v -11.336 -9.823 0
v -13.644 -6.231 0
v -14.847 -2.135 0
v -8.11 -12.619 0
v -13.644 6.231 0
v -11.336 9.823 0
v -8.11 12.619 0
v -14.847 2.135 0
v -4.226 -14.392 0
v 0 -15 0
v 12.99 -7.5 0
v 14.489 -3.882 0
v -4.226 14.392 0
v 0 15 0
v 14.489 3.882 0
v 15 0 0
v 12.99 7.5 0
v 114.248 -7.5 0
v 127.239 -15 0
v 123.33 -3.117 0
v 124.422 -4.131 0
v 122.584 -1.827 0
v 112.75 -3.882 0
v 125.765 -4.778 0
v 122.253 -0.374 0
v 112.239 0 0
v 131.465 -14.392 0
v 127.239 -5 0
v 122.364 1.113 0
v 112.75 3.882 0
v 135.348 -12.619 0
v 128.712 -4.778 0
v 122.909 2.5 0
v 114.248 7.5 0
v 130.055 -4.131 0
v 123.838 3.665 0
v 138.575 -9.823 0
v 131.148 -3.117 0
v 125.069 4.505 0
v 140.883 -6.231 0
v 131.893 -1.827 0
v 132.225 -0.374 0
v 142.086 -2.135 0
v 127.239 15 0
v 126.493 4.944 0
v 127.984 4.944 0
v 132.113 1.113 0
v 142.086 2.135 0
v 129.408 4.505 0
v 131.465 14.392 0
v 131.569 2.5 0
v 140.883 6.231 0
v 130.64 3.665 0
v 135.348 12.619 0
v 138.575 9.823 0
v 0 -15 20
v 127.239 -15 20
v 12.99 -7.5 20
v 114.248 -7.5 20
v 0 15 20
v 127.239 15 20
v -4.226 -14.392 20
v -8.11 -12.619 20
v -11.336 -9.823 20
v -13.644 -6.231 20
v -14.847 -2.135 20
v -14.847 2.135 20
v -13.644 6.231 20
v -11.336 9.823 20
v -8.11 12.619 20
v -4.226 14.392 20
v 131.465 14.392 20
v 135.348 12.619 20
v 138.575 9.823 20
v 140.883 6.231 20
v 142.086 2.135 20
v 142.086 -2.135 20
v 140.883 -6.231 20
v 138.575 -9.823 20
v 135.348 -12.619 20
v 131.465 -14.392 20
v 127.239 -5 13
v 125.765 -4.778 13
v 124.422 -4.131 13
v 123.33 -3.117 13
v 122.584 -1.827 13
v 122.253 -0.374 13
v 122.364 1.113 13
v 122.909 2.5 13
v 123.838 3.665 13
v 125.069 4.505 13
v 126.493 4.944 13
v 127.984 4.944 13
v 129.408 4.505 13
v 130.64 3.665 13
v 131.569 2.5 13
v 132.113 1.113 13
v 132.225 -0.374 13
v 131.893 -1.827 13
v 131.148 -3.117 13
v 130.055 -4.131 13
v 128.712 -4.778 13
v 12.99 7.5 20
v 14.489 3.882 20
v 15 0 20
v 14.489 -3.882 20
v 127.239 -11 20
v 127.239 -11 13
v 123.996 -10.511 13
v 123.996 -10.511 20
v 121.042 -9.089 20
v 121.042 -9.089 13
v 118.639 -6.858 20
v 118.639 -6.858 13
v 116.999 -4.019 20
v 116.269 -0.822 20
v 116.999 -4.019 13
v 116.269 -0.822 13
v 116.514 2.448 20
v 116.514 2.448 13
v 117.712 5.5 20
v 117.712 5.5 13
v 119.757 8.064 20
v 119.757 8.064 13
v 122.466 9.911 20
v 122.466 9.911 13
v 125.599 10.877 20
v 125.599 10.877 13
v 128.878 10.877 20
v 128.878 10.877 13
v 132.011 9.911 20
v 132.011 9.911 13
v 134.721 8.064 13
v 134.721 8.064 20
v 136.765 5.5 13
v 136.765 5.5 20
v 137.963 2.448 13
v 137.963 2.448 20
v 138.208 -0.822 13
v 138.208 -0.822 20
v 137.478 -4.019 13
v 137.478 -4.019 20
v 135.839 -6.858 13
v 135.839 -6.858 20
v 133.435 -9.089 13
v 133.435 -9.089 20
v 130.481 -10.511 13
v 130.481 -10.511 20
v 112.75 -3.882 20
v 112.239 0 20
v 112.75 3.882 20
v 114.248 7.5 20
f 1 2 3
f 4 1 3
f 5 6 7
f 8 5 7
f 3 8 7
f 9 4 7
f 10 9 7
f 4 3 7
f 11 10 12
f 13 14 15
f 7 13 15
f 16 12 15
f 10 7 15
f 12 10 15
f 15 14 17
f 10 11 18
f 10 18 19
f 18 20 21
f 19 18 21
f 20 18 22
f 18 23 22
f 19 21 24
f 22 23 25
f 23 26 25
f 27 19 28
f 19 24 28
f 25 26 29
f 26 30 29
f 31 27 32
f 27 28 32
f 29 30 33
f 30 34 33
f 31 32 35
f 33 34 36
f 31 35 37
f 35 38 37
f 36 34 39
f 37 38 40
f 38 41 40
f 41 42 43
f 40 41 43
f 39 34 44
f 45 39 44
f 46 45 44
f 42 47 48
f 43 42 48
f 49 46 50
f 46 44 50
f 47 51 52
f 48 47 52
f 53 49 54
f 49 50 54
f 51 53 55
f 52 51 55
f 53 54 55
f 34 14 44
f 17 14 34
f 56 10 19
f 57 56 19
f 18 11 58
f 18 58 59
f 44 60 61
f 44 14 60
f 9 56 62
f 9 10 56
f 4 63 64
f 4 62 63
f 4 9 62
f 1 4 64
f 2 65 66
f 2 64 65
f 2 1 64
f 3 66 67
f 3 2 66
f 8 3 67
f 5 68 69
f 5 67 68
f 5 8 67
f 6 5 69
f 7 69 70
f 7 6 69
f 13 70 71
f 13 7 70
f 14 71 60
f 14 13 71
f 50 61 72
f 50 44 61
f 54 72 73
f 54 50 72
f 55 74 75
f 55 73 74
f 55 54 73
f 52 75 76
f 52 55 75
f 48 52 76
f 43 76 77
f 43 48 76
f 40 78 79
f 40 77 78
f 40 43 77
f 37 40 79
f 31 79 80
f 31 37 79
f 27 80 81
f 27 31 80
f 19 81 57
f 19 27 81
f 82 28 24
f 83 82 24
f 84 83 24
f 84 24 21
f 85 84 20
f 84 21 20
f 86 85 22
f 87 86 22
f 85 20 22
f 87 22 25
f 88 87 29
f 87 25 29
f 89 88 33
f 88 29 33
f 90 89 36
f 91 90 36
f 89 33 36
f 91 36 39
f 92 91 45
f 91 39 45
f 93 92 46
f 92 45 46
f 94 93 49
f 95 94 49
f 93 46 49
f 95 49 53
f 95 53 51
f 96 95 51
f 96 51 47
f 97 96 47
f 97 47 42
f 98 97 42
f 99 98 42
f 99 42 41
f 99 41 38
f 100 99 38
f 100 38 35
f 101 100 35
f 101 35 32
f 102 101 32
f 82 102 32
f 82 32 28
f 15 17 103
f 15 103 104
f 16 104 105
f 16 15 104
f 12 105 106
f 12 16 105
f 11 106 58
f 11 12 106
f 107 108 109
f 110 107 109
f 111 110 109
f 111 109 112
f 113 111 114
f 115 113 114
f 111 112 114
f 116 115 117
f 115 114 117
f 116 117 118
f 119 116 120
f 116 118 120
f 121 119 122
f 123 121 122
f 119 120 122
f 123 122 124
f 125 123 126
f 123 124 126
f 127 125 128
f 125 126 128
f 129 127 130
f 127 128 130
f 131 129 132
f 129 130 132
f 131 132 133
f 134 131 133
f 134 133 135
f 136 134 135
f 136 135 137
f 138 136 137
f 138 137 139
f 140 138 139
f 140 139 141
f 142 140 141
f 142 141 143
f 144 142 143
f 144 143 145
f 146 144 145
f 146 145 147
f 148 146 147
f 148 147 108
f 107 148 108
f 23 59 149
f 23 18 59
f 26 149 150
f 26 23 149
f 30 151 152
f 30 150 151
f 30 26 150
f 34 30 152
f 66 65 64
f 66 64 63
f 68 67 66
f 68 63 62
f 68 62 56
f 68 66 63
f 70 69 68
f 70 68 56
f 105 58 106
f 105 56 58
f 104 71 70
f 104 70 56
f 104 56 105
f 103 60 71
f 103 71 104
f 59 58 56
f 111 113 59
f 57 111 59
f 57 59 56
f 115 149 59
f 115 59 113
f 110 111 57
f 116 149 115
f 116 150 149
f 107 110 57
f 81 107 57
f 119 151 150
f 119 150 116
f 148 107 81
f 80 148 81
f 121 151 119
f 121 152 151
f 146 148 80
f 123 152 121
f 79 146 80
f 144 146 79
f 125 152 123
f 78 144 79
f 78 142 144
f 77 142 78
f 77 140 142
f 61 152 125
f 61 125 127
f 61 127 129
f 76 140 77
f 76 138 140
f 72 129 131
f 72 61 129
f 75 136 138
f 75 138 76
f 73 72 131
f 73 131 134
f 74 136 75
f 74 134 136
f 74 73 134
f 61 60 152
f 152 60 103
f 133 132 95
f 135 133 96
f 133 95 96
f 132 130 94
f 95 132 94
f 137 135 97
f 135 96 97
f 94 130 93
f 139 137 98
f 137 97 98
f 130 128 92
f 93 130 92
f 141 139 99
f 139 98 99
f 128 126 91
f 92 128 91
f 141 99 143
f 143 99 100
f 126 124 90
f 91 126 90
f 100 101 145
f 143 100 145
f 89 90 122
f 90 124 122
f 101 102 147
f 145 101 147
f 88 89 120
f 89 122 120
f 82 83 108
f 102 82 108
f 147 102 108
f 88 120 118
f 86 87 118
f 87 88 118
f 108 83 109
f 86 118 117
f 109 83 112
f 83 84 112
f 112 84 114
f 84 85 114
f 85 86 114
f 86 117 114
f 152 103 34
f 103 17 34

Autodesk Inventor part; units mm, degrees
ref_plane "YZ Plane" through (0, 0, 0) normal (1, 0, 0) x (0, 1, 0)
ref_plane "XZ Plane" through (0, 0, 0) normal (0, 1, 0) x (-1, 0, 0)
ref_plane "XY Plane" through (0, 0, 0) normal (0, 0, 1) x (1, 0, 0)
sketch "Sketch1" plane through (0, 0, 0) normal (0, 0, 1) x (1, 0, 0)
  circle A0 centre (0, 0) radius 15
  circle A1 centre (127.2387, 0) radius 15
  line L0 (0, 15) -> (127.2387, 15)
  line L1 (0, -15) -> (127.2387, -15)
  line L2 (12.9904, -7.5) -> (114.2483, -7.5)
  line L3 (12.9904, 7.5) -> (114.2483, 7.5)
  dimension "d0" = 30
  dimension "d1" = 127.2387
  dimension "d2" = 7.5
  dimension "d3" = 7.5
extrude "Extrusion1" add sketch "Sketch1" along normal blind 20 contours A0 | A0 L0 A1 L3 | L2 A1 L1 A0 | A1
sketch "Sketch2" plane through (0, 0, 20) normal (0, 0, 1) x (1, 0, 0)
  arc A0 (127.2387, -15) -> (127.2387, 15) centre (127.2387, 0) ccw projected
  point P0 (0, 0)
  point P1 (142.2387, 0)
hole "Hole1" at (127.2387, 0, 20) direction (0, 0, -1) diameter 10 end through all counterbore diameter 22 counterbore depth 7
properties part number "PARALLEL_LINKAGE_LH"
